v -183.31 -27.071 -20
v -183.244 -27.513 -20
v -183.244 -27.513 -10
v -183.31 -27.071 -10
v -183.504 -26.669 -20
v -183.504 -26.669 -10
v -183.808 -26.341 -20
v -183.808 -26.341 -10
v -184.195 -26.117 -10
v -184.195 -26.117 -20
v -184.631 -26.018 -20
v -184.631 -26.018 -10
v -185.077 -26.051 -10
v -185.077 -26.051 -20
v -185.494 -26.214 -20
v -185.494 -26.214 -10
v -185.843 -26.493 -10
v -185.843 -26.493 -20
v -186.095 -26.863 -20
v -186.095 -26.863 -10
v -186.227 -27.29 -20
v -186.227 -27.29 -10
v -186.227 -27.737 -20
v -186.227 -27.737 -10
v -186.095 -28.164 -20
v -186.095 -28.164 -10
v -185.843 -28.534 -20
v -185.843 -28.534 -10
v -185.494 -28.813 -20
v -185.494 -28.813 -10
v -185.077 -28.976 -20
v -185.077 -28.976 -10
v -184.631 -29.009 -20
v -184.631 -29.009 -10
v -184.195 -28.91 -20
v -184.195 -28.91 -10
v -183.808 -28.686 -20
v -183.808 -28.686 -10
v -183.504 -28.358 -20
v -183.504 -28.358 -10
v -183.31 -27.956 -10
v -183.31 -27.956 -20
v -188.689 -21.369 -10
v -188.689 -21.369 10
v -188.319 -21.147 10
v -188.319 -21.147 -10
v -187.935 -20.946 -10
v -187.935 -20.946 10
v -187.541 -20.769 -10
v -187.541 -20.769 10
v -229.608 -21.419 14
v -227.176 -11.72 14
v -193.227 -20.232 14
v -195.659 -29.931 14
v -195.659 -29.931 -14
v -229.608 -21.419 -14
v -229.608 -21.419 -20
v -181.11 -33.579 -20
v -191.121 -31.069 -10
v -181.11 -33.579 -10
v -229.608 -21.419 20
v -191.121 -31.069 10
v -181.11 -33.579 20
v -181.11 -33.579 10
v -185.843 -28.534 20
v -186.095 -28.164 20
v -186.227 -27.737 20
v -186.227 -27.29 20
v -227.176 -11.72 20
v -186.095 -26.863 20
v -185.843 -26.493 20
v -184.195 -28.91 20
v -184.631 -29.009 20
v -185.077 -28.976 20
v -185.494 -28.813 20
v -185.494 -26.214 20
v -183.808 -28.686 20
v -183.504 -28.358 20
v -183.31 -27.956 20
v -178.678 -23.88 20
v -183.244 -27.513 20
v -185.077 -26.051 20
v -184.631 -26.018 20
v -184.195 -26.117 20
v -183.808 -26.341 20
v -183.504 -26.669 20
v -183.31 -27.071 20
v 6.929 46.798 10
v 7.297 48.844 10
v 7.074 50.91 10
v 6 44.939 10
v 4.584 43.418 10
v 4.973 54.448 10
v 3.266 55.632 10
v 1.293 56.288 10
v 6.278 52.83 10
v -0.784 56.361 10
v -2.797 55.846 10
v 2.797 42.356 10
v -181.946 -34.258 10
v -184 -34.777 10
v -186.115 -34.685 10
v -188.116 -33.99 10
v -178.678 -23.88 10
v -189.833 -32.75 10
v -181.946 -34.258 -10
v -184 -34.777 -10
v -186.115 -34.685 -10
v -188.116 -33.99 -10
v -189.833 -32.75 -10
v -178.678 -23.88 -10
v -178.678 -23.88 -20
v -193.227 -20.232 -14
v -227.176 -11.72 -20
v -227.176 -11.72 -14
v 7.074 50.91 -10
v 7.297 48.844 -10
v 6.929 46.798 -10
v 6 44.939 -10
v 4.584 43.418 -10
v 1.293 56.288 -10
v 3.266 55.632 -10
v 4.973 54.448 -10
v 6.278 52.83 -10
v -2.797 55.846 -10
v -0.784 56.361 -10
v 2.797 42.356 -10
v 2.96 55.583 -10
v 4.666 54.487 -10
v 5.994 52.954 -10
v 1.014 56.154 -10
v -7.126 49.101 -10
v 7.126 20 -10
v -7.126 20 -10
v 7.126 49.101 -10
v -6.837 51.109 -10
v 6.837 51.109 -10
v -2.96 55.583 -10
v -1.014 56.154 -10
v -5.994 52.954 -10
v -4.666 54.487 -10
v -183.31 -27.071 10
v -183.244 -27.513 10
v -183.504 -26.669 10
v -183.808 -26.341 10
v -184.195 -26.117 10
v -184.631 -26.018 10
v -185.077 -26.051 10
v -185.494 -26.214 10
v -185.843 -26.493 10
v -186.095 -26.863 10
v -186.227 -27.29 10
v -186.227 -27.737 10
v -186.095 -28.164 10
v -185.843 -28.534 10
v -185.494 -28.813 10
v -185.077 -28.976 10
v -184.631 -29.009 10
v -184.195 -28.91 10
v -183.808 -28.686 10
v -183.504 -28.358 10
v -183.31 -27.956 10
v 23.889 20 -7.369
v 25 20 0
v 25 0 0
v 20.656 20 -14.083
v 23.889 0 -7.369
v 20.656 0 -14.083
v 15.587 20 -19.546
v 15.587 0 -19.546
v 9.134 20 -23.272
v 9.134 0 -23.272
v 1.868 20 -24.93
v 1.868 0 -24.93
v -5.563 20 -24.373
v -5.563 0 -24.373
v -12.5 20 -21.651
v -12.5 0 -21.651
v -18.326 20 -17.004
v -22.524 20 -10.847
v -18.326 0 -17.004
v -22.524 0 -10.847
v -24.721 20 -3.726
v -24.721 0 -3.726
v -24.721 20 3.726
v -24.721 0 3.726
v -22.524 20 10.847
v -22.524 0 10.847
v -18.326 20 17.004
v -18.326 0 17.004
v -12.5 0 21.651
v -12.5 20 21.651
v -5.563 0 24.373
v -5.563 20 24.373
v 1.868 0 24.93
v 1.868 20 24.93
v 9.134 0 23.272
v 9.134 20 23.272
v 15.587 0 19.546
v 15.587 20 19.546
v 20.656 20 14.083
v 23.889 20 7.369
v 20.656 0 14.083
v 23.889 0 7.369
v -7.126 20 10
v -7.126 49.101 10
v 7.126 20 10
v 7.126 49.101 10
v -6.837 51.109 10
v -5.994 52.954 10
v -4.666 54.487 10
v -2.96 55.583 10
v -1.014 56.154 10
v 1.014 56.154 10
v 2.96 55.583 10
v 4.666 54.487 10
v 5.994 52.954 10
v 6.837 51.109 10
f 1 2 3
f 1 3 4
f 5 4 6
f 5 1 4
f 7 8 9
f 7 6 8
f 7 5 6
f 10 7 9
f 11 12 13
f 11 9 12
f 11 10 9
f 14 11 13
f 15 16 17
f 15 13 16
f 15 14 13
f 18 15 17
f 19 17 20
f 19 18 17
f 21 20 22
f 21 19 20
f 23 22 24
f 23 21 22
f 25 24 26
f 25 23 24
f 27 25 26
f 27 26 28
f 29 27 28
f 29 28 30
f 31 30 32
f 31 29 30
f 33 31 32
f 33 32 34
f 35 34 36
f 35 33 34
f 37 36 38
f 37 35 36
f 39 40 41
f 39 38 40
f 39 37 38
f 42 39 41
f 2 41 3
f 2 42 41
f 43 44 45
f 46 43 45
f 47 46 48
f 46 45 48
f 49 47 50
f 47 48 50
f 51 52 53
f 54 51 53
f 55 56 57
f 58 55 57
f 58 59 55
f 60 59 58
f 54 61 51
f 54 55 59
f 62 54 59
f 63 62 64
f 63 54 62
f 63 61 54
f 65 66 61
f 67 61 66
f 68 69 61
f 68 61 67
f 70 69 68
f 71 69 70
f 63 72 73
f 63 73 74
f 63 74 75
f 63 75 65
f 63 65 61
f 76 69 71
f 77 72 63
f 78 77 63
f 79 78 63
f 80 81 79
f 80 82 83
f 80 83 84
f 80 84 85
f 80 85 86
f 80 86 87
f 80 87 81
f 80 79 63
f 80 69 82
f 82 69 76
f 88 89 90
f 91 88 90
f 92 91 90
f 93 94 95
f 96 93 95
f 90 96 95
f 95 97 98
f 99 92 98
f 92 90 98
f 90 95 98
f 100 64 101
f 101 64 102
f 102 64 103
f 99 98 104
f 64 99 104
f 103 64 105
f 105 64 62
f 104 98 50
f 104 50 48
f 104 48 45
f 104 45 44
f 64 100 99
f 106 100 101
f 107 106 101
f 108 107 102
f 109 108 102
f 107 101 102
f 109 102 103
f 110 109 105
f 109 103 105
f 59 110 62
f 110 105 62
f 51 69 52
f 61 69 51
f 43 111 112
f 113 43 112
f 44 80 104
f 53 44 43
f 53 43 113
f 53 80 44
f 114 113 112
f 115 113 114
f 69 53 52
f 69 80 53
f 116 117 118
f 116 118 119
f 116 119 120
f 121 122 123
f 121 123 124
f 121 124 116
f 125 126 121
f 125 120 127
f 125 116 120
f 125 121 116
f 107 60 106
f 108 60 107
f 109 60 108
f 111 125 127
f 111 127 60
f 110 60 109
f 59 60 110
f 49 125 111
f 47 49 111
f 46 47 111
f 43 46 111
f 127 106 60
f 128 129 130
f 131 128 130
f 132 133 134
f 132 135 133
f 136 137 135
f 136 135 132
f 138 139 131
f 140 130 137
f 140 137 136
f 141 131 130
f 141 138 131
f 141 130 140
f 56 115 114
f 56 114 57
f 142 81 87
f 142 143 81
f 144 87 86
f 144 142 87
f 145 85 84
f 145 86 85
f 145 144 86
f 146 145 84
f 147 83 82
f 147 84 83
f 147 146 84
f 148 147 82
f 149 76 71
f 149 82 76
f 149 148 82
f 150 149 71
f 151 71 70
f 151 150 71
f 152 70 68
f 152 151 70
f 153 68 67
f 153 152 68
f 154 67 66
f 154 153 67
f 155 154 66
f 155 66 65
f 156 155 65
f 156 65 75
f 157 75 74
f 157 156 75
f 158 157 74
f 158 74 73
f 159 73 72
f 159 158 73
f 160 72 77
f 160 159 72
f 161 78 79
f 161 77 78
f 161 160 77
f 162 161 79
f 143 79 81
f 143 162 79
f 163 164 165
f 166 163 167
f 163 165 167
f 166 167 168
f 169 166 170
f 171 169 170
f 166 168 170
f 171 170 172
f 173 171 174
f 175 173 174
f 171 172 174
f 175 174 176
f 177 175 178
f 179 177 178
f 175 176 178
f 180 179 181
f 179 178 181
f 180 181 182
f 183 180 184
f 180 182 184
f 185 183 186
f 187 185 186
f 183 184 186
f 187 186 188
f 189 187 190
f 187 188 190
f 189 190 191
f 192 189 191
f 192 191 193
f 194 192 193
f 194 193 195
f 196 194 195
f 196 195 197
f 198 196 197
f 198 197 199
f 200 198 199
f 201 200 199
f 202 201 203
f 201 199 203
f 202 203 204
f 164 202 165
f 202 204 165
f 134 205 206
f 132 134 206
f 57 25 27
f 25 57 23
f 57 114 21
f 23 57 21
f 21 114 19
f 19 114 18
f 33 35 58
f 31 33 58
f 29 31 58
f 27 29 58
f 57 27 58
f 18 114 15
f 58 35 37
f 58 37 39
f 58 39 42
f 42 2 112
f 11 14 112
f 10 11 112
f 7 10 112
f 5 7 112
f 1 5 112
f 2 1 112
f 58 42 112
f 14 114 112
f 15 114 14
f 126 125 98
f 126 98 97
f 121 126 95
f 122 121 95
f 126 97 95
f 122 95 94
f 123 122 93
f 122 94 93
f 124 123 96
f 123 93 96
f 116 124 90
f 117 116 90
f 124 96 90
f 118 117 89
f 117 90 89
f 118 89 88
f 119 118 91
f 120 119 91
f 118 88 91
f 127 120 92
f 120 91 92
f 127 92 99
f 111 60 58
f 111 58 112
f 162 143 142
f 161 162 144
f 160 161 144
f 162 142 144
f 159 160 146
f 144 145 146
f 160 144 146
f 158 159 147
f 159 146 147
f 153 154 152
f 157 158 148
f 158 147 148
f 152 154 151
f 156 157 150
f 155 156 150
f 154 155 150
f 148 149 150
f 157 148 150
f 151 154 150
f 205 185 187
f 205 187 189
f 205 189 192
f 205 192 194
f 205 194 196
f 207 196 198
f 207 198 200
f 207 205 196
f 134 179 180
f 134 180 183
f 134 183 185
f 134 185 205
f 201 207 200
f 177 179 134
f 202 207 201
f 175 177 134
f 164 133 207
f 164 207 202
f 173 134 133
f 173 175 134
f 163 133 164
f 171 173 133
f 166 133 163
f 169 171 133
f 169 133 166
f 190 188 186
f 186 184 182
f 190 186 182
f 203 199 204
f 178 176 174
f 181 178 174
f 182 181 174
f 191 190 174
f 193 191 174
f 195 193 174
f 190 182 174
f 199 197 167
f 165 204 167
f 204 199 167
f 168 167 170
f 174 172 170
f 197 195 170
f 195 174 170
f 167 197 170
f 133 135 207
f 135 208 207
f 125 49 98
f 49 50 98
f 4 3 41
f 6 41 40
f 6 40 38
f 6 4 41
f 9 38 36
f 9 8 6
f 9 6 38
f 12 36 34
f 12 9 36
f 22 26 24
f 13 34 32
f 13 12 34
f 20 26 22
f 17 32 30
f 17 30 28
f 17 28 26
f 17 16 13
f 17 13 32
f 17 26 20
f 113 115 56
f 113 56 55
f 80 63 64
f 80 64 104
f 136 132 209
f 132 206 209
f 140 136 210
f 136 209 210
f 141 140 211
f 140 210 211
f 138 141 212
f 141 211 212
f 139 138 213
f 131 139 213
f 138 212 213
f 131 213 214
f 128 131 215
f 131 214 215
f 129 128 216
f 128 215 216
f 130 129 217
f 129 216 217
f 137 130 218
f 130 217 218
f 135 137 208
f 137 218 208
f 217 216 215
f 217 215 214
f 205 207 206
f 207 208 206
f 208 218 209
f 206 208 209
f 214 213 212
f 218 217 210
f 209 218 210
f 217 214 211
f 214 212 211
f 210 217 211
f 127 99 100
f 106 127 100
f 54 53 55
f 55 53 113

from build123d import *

# Parameters (mm, degrees)
SKETCH_2_R          = 25
EXTRUDE_1_DEPTH     = 20
EXTRUDE_2_DEPTH     = 10
EXTRUDE_3_DEPTH     = 10
SKETCH_6_R          = 1.5
EXTRUDE_4_DEPTH     = 30
SKETCH_7_W          = 35
SKETCH_7_H          = 28
SKETCH_7_W_2        = 82.955010688
SKETCH_7_H_2        = 10
CUT_EXTRUDE_1_DEPTH = 23.993907244


with BuildPart() as part:
    # 草圖2 → 填料-伸長1 (new body)
    with BuildSketch(Plane(origin=(0, 0, 0), x_dir=(1, 0, 0), z_dir=(0, 1, 0))):
        Circle(SKETCH_2_R)
    extrude(amount=EXTRUDE_1_DEPTH)

    # 草圖4 → 填料-伸長2 (add, symmetric)
    with BuildSketch(Plane.XY):
        with BuildLine():
            Line((-7.125648149, 20), (-7.125648149, 49.101375051))
            ThreePointArc((-7.125648149, 49.101375051), (0, 56.227023201), (7.125648149, 49.101375051))
            Line((7.125648149, 49.101375051), (7.125648149, 20))
            ThreePointArc((7.125648149, 20), (0, 12.874351851), (-7.125648149, 20))
        make_face()
    extrude(amount=EXTRUDE_2_DEPTH, both=True)


with BuildPart() as body_2:
    # 草圖5 → 填料-伸長3 (new body, symmetric)
    with BuildSketch(Plane.XY):
        with BuildLine():
            Line((2.797199891, 42.356410459), (-181.946306774, -34.25844936))
            ThreePointArc((-181.946306774, -34.25844936), (-191.488471258, -30.310684658), (-187.540706557, -20.768520175))
            Line((-187.540706557, -20.768520175), (-2.797199891, 55.846339644))
            ThreePointArc((-2.797199891, 55.846339644), (6.744964593, 51.898574942), (2.797199891, 42.356410459))
        make_face()
    extrude(amount=EXTRUDE_3_DEPTH, both=True)

    # 草圖6 → 填料-伸長4 (add, symmetric)
    with BuildSketch(Plane.XY):
        Polygon((-181.109627774, -33.579366748), (-178.677624685, -23.879605876), (-227.176429045, -11.71959043), (-229.608432134, -21.419351302), align=None)
        with Locations((-184.743506665, -27.513484767)):
            Circle(SKETCH_6_R, mode=Mode.SUBTRACT)
    extrude(amount=EXTRUDE_4_DEPTH, both=True)

    # 草圖7 → 除料-伸長1 (cut, through all)
    with BuildSketch(Plane(origin=(-16.201299347, -64.616994186, 0), x_dir=(0.969976087, -0.243200309, 0), z_dir=(0.243200309, 0.969976087, 0))):
        with Locations((-200.005495736, 0)):
            Rectangle(SKETCH_7_W, SKETCH_7_H)
        with Locations((-176.027990392, 25)):
            Rectangle(SKETCH_7_W_2, SKETCH_7_H_2)
        with Locations((-176.027990392, -25)):
            Rectangle(SKETCH_7_W_2, SKETCH_7_H_2)
    extrude(amount=-CUT_EXTRUDE_1_DEPTH, mode=Mode.SUBTRACT)


solid = Compound([part.part, body_2.part])
